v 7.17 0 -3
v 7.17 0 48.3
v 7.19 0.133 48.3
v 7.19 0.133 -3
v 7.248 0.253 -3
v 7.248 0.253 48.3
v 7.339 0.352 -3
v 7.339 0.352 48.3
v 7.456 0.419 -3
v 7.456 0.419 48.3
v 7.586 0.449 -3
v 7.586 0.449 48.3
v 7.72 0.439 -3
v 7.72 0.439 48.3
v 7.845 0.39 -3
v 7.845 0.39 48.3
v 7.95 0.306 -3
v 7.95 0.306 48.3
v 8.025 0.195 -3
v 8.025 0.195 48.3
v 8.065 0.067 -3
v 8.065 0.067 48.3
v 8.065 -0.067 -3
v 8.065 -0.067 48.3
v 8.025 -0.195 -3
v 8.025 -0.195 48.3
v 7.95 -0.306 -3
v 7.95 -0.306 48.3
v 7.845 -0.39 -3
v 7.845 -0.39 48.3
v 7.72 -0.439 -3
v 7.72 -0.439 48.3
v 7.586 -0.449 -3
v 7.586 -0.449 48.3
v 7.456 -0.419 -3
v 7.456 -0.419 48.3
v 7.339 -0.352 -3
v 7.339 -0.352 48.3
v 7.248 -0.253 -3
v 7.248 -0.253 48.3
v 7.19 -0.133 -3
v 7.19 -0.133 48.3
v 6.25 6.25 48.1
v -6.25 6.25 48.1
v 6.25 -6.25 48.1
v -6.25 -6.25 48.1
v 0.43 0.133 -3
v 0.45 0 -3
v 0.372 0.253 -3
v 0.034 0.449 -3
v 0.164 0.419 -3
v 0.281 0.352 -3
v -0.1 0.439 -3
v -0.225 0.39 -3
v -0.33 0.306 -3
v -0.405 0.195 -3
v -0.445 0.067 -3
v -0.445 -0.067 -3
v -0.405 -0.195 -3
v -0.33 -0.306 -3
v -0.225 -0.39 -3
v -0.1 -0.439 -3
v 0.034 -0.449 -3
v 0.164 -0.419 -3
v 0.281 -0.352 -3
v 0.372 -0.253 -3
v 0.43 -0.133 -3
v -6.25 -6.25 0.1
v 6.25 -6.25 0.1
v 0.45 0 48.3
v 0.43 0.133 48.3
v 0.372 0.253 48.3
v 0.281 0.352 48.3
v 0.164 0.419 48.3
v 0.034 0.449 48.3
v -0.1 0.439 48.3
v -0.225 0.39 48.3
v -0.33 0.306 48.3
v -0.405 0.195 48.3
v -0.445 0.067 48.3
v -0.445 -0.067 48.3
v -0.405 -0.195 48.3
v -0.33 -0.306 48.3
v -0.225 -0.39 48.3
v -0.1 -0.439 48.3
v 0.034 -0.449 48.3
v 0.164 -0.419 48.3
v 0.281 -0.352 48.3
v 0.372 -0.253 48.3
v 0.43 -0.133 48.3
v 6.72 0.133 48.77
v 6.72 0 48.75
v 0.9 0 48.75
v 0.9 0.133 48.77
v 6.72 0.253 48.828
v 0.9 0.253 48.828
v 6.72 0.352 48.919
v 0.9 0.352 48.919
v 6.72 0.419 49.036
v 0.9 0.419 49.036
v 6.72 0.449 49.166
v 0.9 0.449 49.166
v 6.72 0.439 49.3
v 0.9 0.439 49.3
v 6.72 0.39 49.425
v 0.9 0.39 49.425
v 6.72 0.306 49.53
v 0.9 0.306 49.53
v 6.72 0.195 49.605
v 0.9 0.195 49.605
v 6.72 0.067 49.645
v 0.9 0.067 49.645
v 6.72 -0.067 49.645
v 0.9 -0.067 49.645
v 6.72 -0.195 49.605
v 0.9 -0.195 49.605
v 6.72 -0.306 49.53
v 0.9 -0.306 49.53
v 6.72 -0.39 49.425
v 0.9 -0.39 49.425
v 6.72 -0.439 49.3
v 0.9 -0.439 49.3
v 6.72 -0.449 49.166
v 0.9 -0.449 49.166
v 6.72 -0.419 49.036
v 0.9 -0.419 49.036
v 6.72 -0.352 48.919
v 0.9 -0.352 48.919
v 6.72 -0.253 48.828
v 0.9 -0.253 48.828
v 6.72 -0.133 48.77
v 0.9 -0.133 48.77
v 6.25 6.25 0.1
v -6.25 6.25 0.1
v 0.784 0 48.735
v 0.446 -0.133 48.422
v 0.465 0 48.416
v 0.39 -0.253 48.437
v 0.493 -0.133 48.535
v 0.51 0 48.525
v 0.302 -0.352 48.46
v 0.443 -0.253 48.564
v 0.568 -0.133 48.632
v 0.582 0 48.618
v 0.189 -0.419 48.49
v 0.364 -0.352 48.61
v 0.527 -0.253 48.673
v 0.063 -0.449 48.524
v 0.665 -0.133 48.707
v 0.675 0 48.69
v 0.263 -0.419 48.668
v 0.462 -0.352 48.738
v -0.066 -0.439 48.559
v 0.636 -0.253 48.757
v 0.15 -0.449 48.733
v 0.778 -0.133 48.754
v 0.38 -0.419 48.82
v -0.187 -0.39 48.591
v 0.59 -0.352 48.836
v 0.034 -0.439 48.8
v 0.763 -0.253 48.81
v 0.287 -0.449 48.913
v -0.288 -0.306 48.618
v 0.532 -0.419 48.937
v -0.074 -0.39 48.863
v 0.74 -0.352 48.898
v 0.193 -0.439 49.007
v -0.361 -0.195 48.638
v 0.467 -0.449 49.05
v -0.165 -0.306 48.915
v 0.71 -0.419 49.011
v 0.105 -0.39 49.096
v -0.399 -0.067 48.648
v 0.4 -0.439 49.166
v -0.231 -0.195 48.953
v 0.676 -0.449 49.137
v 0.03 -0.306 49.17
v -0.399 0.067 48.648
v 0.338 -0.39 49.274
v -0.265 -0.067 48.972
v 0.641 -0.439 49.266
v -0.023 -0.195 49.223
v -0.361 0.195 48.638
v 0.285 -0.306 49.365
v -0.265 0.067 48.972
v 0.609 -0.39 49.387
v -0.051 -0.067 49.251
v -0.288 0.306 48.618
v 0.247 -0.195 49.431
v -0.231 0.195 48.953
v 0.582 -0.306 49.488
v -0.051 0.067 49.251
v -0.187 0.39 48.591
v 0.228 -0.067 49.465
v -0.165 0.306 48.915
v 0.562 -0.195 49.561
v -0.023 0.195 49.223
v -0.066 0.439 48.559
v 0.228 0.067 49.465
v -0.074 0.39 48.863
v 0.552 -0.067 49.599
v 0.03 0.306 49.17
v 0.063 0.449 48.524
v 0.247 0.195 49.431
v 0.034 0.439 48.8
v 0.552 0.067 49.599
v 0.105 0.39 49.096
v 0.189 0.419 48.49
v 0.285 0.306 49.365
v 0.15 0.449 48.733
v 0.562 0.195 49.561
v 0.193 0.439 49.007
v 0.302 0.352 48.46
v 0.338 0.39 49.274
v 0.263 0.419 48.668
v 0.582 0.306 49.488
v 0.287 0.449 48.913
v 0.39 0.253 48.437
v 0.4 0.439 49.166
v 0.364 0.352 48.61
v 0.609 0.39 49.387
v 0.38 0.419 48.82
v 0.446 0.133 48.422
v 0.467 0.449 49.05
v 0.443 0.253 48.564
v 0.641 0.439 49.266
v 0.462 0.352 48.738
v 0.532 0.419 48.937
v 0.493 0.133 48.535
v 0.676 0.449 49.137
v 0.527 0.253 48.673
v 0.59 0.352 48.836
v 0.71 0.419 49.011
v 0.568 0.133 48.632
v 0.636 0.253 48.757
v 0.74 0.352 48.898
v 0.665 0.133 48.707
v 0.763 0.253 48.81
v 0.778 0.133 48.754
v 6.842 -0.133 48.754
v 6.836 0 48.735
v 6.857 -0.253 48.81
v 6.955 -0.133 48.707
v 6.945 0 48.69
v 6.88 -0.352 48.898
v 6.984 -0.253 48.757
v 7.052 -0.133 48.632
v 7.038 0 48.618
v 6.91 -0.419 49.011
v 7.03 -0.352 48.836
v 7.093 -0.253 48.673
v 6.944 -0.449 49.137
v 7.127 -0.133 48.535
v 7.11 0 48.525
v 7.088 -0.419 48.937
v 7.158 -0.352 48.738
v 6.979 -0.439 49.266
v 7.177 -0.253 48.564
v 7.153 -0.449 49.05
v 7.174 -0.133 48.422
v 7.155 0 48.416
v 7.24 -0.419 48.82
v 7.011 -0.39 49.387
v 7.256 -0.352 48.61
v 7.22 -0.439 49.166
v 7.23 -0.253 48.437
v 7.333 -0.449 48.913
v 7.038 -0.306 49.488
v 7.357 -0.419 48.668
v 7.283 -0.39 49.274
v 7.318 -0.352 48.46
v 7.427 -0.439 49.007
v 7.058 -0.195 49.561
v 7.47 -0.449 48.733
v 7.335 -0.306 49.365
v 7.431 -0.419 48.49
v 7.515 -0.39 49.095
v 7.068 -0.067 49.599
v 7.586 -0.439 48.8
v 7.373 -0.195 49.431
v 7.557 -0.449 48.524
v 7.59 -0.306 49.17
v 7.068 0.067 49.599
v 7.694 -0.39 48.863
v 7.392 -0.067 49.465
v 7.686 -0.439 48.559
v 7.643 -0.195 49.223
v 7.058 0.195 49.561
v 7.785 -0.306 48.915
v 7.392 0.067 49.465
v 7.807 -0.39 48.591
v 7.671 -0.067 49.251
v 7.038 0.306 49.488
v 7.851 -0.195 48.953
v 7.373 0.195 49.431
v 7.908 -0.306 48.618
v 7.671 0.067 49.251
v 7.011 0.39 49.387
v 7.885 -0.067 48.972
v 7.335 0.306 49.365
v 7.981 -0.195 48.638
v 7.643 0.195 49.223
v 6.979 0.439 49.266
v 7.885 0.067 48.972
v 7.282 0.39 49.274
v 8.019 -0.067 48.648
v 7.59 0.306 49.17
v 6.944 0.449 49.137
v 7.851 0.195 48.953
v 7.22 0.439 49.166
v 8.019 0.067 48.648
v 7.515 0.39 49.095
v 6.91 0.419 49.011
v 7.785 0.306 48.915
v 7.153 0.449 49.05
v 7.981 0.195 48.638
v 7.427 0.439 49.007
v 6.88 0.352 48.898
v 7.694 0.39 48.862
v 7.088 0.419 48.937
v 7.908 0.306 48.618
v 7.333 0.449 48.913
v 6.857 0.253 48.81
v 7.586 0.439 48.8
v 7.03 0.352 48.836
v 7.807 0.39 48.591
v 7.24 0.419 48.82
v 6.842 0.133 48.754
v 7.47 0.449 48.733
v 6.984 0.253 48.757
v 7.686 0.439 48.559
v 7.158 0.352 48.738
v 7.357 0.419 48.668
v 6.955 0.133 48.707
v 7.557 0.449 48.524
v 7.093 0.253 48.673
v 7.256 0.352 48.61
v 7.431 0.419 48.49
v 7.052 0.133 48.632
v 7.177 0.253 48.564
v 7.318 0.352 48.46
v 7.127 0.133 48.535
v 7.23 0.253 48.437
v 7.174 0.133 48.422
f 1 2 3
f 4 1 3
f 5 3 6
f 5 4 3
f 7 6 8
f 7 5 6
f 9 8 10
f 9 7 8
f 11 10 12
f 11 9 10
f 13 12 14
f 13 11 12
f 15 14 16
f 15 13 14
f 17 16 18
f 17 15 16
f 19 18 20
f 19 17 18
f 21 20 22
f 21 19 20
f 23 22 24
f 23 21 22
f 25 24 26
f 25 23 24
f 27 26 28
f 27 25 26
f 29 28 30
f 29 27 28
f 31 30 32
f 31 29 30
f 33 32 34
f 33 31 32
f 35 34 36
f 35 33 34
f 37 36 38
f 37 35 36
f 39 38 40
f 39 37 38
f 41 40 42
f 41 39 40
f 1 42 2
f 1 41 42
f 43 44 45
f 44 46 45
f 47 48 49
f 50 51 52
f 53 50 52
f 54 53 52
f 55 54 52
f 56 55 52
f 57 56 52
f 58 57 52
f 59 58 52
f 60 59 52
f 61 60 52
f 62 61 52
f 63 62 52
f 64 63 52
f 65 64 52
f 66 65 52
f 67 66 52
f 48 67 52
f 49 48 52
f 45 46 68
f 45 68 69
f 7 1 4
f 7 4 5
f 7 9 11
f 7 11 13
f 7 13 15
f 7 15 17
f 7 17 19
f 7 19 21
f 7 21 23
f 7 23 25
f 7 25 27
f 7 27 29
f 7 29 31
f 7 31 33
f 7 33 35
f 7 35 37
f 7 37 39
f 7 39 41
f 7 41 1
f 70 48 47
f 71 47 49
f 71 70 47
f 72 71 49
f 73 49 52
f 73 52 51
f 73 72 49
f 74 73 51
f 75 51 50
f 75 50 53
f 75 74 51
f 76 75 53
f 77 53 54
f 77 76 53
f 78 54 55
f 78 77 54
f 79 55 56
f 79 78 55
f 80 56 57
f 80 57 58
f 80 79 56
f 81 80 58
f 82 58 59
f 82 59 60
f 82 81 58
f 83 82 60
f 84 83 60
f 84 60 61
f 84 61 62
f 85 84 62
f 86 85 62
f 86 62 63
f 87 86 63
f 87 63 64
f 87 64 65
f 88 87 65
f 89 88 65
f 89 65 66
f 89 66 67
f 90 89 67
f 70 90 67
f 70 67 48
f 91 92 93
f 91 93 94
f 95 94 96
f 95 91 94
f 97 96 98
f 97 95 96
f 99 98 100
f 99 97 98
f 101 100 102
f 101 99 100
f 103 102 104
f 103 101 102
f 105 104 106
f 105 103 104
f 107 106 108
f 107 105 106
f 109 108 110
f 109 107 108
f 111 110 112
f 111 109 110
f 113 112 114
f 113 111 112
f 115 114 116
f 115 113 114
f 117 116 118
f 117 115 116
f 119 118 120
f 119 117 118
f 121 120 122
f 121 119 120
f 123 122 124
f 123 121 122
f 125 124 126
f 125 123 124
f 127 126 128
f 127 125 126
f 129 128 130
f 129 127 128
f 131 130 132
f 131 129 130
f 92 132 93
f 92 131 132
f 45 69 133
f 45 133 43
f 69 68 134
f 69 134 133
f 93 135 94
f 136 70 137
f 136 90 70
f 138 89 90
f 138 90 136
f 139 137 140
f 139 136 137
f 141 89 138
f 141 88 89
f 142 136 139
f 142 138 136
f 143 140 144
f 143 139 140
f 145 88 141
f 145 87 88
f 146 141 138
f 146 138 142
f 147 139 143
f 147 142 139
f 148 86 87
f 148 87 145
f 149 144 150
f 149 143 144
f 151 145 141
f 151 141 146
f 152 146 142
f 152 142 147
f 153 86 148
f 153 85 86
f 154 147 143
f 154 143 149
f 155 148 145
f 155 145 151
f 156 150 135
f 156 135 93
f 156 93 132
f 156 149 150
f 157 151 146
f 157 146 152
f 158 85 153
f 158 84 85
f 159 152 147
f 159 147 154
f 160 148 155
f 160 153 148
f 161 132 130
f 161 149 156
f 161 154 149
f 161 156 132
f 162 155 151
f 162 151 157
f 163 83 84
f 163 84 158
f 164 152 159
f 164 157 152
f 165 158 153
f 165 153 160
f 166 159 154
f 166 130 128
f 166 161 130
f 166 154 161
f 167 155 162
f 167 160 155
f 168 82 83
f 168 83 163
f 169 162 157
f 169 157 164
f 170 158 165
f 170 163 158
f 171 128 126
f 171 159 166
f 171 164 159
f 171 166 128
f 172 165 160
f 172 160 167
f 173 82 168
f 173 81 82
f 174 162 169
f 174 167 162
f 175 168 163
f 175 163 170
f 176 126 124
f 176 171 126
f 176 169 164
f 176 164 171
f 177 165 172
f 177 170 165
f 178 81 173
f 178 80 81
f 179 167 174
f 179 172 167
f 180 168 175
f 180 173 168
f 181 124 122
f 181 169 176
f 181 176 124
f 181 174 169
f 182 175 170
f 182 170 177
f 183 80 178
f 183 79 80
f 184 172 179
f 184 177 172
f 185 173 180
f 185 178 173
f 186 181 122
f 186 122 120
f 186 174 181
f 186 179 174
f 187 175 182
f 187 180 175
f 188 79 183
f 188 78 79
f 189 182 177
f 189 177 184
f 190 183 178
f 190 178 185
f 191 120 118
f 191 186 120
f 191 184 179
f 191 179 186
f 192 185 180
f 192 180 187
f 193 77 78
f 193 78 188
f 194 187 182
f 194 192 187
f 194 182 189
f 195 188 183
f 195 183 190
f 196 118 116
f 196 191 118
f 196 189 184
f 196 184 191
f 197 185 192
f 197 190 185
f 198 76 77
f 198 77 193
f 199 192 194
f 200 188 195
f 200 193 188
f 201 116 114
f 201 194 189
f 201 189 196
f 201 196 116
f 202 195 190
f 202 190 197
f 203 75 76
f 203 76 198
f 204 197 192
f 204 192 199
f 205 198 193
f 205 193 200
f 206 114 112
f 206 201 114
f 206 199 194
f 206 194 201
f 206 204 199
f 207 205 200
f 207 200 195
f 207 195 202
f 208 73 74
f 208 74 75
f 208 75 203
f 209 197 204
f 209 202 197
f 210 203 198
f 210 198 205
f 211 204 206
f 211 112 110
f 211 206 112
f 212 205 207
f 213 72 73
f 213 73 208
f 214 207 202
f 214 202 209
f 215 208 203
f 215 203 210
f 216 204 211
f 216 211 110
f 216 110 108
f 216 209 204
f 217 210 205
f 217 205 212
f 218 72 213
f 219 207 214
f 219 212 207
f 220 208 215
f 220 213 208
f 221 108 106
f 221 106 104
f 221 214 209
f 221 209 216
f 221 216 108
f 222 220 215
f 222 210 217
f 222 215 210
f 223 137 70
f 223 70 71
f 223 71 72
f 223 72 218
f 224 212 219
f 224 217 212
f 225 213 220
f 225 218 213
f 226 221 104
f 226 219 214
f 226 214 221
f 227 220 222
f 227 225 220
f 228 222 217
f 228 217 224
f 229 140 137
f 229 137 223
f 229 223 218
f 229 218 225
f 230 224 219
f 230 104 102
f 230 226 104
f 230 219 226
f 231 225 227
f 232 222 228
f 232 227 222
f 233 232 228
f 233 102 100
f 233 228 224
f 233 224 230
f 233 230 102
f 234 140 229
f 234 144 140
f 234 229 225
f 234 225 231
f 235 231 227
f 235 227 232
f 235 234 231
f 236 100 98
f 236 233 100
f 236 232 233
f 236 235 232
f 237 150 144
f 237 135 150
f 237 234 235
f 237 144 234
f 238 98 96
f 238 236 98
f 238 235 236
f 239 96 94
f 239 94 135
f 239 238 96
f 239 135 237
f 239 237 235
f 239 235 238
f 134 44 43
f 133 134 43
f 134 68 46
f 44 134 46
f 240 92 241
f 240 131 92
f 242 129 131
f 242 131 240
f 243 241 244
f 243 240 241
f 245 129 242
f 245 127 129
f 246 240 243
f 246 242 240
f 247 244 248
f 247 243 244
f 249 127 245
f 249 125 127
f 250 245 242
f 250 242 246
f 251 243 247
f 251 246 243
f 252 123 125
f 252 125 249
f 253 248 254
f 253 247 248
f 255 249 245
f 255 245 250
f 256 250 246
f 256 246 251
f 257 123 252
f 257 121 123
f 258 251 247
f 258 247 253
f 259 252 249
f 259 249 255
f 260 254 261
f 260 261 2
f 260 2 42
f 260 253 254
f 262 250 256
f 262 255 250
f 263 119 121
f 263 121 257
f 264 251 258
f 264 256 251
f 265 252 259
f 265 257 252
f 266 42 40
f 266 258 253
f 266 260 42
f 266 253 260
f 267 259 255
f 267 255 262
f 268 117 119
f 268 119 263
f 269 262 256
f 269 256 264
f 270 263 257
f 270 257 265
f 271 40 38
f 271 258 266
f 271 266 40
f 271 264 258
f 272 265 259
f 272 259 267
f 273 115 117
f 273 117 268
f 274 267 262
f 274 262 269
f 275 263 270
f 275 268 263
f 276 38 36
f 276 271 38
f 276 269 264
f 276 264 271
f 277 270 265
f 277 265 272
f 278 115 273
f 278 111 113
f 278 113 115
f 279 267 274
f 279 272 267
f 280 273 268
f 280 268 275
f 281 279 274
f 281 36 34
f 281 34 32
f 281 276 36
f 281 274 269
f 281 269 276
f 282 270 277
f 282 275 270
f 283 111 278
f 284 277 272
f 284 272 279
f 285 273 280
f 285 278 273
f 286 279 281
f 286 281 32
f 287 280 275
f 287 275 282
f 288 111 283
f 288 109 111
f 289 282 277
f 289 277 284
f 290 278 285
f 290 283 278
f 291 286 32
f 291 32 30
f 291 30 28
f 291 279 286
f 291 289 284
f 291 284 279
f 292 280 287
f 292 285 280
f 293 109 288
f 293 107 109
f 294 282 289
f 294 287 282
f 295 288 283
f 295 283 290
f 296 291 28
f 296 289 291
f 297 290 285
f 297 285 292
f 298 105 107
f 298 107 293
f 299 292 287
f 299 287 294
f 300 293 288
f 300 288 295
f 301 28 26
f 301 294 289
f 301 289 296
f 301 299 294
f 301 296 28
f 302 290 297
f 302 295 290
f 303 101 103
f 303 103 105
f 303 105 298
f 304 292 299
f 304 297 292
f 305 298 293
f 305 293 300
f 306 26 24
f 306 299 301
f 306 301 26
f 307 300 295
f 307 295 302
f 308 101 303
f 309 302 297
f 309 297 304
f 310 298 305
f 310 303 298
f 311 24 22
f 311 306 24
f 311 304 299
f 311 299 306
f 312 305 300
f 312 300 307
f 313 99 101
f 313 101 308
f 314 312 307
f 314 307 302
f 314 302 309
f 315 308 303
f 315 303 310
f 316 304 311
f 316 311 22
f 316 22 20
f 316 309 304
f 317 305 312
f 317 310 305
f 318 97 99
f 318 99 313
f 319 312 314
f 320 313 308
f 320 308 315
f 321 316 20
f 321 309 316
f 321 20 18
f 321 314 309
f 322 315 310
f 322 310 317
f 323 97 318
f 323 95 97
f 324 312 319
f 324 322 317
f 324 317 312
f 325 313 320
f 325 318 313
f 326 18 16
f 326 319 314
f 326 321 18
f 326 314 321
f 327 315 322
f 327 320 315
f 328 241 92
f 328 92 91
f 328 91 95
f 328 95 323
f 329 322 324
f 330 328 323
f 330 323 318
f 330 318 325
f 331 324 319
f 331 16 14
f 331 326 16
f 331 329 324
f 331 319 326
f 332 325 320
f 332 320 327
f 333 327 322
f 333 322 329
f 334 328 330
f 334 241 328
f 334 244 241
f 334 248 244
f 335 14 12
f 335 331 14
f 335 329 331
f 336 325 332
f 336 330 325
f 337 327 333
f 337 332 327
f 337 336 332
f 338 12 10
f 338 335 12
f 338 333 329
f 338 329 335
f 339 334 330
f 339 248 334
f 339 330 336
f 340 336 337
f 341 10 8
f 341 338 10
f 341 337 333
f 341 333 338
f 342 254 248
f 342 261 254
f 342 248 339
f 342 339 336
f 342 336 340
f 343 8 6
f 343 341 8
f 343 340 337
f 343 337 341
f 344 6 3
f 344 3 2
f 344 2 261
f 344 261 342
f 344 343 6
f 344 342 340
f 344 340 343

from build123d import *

# Parameters (mm, degrees)
SKETCH_R    = 0.45
SKETCH002_W = 12.5
SKETCH002_H = 48
PAD_DEPTH   = 6.25


with BuildPart() as sweep_body:
    # Sweep: sweep along a path in Sketch001
    with BuildLine(Plane.XZ) as sweep_path:
        Line((0, -3), (0, 48.3))
        ThreePointArc((0, 48.3), (0.263608, 48.9364), (0.900012, 49.2))
        Line((0.900012, 49.2), (6.72, 49.2))
        ThreePointArc((6.72, 49.2), (7.356396, 48.936396), (7.62, 48.3))
        Line((7.62, 48.3), (7.62, -3))
    # Sketch → Sweep (sweep)
    with BuildSketch(Plane.XY.offset(-2)):
        Circle(SKETCH_R)
    sweep(path=sweep_path.line)


with BuildPart() as pad:
    # Sketch002 → Pad (new body, symmetric)
    with BuildSketch(Plane.XZ):
        with Locations((0, 24.1)):
            Rectangle(SKETCH002_W, SKETCH002_H)
    extrude(amount=PAD_DEPTH, both=True)


solid = Compound([sweep_body.part, pad.part])
